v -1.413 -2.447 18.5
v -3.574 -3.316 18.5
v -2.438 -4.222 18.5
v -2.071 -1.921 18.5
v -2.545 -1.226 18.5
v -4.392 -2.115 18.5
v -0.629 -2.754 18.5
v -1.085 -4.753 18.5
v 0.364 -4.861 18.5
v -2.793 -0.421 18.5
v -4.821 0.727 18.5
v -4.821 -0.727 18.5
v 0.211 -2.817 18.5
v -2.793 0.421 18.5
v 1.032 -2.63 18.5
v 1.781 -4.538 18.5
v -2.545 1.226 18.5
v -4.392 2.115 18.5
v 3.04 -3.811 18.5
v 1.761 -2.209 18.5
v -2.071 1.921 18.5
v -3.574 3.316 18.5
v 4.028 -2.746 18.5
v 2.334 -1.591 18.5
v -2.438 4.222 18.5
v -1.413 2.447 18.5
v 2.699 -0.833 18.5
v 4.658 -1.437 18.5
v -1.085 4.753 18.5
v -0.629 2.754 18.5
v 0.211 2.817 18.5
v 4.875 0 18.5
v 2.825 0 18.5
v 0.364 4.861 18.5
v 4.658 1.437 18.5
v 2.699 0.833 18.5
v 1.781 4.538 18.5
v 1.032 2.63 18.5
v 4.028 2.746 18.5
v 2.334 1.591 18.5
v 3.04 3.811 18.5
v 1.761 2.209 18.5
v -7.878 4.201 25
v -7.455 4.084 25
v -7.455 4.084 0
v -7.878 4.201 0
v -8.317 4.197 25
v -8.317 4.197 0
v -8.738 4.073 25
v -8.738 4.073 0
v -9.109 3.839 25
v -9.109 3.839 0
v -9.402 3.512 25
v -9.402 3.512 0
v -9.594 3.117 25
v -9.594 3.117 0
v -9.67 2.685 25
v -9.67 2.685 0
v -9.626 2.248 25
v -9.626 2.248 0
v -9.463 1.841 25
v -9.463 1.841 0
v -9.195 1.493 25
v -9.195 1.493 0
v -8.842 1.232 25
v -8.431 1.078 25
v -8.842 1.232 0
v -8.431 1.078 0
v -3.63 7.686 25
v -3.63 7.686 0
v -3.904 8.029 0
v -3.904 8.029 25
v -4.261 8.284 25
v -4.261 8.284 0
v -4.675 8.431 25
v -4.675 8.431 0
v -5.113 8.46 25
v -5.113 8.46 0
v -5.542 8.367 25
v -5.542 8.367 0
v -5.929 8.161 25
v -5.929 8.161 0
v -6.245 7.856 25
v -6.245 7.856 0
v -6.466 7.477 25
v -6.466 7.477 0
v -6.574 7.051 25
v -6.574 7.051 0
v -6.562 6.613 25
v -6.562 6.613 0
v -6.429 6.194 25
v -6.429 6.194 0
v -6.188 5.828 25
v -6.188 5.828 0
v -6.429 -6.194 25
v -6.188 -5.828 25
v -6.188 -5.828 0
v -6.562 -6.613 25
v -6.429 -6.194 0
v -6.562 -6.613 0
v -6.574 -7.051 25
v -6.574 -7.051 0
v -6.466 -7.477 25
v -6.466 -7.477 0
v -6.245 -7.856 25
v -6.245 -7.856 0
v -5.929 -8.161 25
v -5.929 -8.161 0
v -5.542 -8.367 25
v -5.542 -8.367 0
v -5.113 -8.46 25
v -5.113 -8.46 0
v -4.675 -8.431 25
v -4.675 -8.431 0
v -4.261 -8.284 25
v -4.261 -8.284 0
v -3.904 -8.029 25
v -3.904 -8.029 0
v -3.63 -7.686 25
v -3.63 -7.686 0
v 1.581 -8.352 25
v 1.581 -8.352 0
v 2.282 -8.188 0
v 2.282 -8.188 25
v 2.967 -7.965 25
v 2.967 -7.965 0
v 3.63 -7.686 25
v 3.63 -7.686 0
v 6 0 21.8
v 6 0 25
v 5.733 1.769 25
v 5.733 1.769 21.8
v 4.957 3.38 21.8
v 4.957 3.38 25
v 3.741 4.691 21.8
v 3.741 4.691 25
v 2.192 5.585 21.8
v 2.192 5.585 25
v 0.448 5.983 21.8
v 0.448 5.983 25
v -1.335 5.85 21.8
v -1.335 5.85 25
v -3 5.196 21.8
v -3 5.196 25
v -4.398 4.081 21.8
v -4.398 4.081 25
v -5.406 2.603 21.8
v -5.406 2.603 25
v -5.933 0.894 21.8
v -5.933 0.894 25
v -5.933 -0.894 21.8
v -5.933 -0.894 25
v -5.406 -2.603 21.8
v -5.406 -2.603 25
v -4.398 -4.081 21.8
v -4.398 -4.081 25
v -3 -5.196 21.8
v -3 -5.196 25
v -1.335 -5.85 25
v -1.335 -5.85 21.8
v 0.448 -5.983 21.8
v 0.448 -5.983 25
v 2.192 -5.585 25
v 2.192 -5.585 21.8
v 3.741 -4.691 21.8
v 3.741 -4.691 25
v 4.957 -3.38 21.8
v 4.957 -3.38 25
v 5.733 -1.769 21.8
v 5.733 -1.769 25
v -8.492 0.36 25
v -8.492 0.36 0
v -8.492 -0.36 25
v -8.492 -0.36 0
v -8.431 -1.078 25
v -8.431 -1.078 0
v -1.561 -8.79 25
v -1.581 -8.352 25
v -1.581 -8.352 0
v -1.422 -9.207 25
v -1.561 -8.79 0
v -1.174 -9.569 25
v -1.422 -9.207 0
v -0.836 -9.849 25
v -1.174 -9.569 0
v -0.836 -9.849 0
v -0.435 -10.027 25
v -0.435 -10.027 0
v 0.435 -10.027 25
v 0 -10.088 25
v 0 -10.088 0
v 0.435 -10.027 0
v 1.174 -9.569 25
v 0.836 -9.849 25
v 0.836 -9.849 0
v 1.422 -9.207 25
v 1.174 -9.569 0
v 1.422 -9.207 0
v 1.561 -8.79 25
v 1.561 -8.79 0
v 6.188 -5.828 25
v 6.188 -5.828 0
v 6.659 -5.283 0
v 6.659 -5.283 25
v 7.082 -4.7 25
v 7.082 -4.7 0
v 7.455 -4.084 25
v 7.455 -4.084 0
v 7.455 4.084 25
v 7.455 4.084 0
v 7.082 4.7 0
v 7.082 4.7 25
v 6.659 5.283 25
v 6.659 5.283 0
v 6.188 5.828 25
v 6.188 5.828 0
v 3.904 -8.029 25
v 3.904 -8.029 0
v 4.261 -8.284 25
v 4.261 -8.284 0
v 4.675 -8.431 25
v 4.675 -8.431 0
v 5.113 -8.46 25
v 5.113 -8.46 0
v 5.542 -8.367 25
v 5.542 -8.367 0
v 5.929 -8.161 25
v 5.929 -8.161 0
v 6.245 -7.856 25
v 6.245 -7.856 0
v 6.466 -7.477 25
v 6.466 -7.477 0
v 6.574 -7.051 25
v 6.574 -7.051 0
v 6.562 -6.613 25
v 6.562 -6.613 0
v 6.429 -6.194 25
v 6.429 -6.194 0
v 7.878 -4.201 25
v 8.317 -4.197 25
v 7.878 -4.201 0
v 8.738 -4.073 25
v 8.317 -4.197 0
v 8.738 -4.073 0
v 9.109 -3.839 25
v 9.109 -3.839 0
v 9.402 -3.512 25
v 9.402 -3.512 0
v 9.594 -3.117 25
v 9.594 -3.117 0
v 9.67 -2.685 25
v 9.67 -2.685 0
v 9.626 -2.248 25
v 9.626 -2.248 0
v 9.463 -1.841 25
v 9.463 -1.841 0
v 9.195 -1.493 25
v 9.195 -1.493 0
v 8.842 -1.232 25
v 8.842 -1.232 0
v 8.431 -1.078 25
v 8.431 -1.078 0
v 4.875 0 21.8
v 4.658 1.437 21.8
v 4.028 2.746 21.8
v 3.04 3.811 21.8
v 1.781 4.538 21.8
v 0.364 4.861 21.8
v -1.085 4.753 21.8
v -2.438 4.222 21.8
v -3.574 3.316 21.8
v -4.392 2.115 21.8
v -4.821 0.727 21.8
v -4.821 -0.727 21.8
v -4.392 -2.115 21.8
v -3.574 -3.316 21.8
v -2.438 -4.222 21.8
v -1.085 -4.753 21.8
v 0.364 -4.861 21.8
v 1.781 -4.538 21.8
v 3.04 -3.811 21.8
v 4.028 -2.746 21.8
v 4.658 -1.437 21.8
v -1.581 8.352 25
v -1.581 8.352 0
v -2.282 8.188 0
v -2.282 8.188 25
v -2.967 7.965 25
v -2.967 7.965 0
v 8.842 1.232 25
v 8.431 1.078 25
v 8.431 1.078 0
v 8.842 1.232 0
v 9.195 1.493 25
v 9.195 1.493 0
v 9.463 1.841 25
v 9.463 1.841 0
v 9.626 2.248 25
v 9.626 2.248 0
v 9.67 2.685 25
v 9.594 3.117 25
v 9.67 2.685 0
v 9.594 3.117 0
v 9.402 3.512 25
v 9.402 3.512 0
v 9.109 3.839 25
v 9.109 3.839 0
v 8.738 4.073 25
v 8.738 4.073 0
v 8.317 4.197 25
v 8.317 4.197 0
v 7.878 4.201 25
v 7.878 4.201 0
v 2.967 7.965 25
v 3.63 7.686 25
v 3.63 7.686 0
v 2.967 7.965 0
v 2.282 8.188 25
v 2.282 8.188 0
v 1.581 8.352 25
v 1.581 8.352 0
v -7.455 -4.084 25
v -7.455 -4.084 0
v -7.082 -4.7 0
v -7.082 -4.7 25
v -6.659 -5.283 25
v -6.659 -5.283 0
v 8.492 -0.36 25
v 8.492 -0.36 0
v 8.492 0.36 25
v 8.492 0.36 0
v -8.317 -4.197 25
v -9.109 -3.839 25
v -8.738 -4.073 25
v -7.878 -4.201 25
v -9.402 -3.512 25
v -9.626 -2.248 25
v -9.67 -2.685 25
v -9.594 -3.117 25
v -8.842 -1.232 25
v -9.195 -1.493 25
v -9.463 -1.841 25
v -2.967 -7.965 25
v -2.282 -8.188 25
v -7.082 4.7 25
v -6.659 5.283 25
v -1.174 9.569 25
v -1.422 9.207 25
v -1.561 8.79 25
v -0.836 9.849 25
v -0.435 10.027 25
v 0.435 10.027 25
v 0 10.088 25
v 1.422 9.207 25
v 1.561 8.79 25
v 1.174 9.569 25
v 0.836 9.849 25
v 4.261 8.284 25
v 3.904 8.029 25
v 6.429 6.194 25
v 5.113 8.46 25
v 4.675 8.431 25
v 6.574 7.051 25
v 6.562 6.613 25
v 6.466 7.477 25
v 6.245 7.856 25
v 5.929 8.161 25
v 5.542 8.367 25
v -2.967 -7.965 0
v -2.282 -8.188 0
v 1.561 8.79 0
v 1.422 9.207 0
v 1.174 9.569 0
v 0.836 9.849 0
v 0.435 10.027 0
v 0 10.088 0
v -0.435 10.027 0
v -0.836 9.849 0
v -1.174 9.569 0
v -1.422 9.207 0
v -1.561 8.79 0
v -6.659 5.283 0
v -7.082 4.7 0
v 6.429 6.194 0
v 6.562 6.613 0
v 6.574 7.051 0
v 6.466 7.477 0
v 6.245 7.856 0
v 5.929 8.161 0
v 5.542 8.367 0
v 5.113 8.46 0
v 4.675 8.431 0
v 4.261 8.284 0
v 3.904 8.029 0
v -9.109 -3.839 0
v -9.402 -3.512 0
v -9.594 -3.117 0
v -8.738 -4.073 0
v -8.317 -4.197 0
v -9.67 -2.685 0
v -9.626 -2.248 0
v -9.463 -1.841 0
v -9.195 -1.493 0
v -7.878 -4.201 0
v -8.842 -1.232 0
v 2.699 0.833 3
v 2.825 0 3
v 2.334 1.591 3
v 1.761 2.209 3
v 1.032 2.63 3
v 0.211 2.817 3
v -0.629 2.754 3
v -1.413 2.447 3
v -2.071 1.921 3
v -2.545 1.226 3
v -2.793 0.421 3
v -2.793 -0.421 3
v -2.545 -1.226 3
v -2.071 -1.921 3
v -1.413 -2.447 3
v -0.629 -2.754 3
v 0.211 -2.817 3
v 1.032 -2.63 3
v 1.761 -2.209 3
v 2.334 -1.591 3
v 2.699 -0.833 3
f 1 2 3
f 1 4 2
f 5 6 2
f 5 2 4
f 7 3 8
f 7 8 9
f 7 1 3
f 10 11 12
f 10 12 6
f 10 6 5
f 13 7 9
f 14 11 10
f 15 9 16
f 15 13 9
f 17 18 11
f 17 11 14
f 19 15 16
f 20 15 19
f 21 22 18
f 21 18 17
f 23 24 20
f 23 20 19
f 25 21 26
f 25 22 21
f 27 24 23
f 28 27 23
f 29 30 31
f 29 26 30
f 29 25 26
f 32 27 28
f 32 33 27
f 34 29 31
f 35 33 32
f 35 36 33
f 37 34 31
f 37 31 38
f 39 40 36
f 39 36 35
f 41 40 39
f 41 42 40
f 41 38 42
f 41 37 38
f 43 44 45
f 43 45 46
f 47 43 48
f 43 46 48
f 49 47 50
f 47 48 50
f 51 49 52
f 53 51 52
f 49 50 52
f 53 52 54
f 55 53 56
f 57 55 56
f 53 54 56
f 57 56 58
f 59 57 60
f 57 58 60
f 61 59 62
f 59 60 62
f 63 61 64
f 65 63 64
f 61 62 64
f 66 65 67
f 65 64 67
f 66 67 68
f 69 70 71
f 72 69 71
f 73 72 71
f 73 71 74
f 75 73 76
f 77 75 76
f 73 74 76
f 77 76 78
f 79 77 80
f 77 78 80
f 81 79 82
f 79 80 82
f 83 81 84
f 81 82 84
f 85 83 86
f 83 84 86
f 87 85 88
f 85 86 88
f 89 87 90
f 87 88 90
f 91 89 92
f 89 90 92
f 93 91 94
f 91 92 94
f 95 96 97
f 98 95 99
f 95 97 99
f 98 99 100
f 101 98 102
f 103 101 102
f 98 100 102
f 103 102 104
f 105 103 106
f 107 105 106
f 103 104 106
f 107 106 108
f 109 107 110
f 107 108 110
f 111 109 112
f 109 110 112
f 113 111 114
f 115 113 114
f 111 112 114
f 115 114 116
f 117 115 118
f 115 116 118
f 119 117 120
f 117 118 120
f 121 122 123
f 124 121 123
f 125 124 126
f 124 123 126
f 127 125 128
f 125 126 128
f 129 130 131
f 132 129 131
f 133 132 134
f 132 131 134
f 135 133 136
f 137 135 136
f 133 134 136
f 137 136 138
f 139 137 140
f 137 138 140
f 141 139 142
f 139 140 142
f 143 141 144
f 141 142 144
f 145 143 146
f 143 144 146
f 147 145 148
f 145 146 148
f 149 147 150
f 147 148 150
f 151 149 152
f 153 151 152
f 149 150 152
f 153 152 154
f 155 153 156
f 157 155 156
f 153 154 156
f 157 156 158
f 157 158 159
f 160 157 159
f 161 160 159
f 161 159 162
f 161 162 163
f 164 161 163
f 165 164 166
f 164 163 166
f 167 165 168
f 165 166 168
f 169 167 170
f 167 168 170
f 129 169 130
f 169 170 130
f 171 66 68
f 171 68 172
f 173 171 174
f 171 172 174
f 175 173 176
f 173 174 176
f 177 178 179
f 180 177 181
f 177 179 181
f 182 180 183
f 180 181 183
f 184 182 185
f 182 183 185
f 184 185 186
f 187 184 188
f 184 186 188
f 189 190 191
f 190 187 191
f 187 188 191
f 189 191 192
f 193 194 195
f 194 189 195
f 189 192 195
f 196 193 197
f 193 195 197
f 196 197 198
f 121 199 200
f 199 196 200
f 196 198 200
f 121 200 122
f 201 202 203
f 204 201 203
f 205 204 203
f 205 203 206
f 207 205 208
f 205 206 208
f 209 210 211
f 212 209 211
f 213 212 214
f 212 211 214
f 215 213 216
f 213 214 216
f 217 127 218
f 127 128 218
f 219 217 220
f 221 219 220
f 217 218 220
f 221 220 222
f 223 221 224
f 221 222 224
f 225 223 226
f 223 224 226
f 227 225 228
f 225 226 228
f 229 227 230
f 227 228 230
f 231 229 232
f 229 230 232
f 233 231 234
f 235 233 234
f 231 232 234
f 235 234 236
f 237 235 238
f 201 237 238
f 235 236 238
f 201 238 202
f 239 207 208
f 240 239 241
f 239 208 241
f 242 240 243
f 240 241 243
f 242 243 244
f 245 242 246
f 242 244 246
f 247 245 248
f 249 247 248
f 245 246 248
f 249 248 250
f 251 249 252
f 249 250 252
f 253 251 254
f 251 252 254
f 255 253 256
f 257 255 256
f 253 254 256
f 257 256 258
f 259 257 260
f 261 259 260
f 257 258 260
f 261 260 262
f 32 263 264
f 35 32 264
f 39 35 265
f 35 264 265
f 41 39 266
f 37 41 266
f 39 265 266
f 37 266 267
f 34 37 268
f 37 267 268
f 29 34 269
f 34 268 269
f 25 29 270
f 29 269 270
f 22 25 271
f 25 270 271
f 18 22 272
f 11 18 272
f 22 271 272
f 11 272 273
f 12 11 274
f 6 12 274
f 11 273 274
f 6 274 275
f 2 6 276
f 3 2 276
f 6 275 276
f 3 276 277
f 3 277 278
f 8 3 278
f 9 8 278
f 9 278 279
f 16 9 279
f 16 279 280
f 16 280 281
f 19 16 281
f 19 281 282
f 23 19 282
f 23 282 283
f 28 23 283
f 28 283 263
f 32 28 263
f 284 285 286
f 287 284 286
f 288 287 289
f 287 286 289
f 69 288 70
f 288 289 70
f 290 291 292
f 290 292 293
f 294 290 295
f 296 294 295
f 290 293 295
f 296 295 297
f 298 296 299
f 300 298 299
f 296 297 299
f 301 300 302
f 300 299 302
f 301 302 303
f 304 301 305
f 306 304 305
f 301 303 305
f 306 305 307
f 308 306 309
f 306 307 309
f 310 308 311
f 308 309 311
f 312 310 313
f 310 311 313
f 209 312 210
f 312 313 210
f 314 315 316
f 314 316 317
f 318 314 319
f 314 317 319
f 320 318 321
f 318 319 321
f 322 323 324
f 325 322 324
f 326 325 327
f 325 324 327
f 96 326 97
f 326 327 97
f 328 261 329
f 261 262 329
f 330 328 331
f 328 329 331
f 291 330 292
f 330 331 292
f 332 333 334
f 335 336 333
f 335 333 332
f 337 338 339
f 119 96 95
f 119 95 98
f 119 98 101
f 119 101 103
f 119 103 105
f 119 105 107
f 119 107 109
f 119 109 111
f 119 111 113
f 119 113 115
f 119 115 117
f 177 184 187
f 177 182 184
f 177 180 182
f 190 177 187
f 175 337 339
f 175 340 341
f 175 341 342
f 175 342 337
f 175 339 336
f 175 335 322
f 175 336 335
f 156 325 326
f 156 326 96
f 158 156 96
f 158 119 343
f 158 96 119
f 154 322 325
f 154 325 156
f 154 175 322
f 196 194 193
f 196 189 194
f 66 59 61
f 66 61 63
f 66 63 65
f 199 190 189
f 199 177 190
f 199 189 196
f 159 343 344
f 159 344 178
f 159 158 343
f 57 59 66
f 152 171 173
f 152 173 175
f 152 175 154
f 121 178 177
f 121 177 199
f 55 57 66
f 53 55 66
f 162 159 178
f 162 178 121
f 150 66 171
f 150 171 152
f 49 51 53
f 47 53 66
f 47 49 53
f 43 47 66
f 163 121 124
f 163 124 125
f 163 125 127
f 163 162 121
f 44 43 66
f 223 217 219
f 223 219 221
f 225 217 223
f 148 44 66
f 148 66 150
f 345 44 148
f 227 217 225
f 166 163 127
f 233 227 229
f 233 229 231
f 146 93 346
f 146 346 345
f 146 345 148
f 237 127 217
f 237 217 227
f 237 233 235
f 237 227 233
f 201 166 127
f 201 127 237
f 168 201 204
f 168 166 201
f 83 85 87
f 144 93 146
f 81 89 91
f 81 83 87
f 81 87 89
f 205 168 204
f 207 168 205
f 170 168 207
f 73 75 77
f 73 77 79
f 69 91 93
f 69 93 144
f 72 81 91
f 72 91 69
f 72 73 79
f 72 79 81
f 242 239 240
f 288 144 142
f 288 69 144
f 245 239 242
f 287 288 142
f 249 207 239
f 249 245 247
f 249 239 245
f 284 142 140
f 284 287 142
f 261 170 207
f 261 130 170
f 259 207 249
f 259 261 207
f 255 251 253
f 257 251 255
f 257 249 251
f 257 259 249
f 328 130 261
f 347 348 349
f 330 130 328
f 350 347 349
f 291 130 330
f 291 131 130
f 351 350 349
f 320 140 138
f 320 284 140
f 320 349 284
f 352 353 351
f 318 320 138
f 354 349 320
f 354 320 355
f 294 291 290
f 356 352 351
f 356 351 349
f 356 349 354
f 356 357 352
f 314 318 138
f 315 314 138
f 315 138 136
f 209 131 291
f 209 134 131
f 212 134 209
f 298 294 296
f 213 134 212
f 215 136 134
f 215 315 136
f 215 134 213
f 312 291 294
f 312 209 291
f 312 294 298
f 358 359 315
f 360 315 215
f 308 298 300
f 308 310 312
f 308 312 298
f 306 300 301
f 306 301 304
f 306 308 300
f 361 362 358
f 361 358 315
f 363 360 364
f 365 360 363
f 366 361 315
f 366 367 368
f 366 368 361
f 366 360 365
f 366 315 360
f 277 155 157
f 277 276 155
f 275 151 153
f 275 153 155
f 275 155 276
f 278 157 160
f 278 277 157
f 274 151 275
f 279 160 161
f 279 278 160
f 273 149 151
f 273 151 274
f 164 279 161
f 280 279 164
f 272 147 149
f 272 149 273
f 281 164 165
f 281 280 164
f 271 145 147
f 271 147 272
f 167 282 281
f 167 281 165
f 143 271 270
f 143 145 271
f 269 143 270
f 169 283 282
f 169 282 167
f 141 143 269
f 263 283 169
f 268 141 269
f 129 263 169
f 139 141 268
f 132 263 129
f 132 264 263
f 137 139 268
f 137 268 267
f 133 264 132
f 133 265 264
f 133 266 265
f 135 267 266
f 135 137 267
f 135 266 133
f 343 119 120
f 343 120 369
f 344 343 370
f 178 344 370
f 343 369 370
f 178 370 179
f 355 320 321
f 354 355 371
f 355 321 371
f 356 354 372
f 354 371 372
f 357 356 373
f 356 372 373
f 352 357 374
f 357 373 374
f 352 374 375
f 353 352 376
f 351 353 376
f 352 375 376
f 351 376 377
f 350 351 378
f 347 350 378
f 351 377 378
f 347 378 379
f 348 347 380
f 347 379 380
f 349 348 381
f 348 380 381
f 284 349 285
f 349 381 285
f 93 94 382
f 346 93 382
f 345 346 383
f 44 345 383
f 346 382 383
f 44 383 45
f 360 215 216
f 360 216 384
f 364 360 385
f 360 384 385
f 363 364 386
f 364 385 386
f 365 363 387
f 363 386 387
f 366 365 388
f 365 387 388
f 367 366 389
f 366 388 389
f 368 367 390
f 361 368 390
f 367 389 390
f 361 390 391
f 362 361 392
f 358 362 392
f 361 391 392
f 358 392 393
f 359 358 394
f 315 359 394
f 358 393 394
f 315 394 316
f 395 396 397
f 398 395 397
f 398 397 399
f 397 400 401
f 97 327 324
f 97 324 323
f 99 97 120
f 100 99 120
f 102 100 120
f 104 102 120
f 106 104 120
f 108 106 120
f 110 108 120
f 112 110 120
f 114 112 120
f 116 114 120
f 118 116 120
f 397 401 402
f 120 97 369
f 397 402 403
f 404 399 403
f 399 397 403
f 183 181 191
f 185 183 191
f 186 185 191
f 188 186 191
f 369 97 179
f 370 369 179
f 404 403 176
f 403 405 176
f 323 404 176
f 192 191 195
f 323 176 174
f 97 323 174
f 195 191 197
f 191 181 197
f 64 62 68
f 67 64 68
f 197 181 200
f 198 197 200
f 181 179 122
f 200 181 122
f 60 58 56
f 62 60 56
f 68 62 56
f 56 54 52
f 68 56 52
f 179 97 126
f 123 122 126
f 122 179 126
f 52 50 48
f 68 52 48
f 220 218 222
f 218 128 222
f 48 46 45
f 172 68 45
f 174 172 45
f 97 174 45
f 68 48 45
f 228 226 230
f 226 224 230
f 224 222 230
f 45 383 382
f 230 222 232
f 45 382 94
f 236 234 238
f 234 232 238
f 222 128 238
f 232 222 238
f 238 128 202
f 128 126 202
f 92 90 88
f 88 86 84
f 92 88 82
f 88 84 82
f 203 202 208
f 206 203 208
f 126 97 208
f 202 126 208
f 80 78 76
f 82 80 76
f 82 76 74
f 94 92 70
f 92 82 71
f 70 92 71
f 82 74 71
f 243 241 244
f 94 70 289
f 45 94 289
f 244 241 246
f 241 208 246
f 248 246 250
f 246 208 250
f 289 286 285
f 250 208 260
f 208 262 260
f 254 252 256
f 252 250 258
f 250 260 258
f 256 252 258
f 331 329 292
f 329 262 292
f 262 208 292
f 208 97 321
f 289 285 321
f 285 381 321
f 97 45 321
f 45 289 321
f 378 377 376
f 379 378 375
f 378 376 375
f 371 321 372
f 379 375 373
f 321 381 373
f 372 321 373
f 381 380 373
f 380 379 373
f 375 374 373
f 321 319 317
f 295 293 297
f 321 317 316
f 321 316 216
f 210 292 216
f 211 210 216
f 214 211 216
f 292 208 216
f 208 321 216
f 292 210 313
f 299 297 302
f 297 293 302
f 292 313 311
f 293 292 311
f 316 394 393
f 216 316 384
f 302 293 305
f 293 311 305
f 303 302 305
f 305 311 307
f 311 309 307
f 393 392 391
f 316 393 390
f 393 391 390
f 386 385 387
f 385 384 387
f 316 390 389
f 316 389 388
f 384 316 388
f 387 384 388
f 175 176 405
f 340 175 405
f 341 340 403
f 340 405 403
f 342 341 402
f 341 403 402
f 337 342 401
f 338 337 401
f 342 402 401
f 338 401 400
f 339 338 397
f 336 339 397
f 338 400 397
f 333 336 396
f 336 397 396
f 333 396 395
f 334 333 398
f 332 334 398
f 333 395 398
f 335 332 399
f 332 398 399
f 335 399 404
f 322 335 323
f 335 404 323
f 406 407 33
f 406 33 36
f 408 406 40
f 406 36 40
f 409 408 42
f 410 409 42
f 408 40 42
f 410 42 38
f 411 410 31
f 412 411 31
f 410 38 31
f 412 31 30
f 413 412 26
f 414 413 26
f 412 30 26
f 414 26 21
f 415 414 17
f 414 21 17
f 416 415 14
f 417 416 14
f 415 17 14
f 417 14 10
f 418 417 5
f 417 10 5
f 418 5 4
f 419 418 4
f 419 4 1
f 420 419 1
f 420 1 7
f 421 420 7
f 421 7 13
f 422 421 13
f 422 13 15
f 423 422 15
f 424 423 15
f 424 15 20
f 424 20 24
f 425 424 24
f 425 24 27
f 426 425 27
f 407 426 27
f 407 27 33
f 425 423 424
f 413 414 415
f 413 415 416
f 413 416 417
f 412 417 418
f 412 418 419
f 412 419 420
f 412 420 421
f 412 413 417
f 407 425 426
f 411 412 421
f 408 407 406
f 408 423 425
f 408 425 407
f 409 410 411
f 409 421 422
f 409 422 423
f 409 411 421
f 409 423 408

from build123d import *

# Parameters (mm, degrees)
F0_R     = 8.5
F1_DEPTH = 25
F2_R     = 2.825
F3_DEPTH = 22
F4_R     = 4.875
F5_DEPTH = 6.5
F6_R     = 6
F7_DEPTH = 3.2
F8_R     = 1.5875
F9_DEPTH = 25


with BuildPart() as f1:
    # F0 (on Top) → F1 (new body)
    with BuildSketch(Plane.XY):
        Circle(F0_R)
    extrude(amount=F1_DEPTH)

    # F2 (on face) → F3 (cut)
    with BuildSketch(Plane.XY.offset(25)):
        Circle(F2_R)
    extrude(amount=-F3_DEPTH, mode=Mode.SUBTRACT)

    # F4 (on face) → F5 (cut)
    with BuildSketch(Plane.XY.offset(25)):
        Circle(F4_R)
    extrude(amount=-F5_DEPTH, mode=Mode.SUBTRACT)

    # F6 (on face) → F7 (cut)
    with BuildSketch(Plane.XY.offset(25)):
        Circle(F6_R)
    extrude(amount=-F7_DEPTH, mode=Mode.SUBTRACT)

    # F8 (on Top) → F9 (join)
    with BuildSketch(Plane.XY):
        with Locations((0, -8.5)):
            Circle(F8_R)
        with Locations((4.996175, -6.876644)):
            Circle(F8_R)
        with Locations((8.08398, -2.626644)):
            Circle(F8_R)
        with Locations((8.08398, 2.626644)):
            Circle(F8_R)
        with Locations((4.996175, 6.876644)):
            Circle(F8_R)
        with Locations((0, 8.5)):
            Circle(F8_R)
        with Locations((-4.996175, 6.876644)):
            Circle(F8_R)
        with Locations((-8.08398, 2.626644)):
            Circle(F8_R)
        with Locations((-8.08398, -2.626644)):
            Circle(F8_R)
        with Locations((-4.996175, -6.876644)):
            Circle(F8_R)
    extrude(amount=F9_DEPTH)


solid = f1.part
